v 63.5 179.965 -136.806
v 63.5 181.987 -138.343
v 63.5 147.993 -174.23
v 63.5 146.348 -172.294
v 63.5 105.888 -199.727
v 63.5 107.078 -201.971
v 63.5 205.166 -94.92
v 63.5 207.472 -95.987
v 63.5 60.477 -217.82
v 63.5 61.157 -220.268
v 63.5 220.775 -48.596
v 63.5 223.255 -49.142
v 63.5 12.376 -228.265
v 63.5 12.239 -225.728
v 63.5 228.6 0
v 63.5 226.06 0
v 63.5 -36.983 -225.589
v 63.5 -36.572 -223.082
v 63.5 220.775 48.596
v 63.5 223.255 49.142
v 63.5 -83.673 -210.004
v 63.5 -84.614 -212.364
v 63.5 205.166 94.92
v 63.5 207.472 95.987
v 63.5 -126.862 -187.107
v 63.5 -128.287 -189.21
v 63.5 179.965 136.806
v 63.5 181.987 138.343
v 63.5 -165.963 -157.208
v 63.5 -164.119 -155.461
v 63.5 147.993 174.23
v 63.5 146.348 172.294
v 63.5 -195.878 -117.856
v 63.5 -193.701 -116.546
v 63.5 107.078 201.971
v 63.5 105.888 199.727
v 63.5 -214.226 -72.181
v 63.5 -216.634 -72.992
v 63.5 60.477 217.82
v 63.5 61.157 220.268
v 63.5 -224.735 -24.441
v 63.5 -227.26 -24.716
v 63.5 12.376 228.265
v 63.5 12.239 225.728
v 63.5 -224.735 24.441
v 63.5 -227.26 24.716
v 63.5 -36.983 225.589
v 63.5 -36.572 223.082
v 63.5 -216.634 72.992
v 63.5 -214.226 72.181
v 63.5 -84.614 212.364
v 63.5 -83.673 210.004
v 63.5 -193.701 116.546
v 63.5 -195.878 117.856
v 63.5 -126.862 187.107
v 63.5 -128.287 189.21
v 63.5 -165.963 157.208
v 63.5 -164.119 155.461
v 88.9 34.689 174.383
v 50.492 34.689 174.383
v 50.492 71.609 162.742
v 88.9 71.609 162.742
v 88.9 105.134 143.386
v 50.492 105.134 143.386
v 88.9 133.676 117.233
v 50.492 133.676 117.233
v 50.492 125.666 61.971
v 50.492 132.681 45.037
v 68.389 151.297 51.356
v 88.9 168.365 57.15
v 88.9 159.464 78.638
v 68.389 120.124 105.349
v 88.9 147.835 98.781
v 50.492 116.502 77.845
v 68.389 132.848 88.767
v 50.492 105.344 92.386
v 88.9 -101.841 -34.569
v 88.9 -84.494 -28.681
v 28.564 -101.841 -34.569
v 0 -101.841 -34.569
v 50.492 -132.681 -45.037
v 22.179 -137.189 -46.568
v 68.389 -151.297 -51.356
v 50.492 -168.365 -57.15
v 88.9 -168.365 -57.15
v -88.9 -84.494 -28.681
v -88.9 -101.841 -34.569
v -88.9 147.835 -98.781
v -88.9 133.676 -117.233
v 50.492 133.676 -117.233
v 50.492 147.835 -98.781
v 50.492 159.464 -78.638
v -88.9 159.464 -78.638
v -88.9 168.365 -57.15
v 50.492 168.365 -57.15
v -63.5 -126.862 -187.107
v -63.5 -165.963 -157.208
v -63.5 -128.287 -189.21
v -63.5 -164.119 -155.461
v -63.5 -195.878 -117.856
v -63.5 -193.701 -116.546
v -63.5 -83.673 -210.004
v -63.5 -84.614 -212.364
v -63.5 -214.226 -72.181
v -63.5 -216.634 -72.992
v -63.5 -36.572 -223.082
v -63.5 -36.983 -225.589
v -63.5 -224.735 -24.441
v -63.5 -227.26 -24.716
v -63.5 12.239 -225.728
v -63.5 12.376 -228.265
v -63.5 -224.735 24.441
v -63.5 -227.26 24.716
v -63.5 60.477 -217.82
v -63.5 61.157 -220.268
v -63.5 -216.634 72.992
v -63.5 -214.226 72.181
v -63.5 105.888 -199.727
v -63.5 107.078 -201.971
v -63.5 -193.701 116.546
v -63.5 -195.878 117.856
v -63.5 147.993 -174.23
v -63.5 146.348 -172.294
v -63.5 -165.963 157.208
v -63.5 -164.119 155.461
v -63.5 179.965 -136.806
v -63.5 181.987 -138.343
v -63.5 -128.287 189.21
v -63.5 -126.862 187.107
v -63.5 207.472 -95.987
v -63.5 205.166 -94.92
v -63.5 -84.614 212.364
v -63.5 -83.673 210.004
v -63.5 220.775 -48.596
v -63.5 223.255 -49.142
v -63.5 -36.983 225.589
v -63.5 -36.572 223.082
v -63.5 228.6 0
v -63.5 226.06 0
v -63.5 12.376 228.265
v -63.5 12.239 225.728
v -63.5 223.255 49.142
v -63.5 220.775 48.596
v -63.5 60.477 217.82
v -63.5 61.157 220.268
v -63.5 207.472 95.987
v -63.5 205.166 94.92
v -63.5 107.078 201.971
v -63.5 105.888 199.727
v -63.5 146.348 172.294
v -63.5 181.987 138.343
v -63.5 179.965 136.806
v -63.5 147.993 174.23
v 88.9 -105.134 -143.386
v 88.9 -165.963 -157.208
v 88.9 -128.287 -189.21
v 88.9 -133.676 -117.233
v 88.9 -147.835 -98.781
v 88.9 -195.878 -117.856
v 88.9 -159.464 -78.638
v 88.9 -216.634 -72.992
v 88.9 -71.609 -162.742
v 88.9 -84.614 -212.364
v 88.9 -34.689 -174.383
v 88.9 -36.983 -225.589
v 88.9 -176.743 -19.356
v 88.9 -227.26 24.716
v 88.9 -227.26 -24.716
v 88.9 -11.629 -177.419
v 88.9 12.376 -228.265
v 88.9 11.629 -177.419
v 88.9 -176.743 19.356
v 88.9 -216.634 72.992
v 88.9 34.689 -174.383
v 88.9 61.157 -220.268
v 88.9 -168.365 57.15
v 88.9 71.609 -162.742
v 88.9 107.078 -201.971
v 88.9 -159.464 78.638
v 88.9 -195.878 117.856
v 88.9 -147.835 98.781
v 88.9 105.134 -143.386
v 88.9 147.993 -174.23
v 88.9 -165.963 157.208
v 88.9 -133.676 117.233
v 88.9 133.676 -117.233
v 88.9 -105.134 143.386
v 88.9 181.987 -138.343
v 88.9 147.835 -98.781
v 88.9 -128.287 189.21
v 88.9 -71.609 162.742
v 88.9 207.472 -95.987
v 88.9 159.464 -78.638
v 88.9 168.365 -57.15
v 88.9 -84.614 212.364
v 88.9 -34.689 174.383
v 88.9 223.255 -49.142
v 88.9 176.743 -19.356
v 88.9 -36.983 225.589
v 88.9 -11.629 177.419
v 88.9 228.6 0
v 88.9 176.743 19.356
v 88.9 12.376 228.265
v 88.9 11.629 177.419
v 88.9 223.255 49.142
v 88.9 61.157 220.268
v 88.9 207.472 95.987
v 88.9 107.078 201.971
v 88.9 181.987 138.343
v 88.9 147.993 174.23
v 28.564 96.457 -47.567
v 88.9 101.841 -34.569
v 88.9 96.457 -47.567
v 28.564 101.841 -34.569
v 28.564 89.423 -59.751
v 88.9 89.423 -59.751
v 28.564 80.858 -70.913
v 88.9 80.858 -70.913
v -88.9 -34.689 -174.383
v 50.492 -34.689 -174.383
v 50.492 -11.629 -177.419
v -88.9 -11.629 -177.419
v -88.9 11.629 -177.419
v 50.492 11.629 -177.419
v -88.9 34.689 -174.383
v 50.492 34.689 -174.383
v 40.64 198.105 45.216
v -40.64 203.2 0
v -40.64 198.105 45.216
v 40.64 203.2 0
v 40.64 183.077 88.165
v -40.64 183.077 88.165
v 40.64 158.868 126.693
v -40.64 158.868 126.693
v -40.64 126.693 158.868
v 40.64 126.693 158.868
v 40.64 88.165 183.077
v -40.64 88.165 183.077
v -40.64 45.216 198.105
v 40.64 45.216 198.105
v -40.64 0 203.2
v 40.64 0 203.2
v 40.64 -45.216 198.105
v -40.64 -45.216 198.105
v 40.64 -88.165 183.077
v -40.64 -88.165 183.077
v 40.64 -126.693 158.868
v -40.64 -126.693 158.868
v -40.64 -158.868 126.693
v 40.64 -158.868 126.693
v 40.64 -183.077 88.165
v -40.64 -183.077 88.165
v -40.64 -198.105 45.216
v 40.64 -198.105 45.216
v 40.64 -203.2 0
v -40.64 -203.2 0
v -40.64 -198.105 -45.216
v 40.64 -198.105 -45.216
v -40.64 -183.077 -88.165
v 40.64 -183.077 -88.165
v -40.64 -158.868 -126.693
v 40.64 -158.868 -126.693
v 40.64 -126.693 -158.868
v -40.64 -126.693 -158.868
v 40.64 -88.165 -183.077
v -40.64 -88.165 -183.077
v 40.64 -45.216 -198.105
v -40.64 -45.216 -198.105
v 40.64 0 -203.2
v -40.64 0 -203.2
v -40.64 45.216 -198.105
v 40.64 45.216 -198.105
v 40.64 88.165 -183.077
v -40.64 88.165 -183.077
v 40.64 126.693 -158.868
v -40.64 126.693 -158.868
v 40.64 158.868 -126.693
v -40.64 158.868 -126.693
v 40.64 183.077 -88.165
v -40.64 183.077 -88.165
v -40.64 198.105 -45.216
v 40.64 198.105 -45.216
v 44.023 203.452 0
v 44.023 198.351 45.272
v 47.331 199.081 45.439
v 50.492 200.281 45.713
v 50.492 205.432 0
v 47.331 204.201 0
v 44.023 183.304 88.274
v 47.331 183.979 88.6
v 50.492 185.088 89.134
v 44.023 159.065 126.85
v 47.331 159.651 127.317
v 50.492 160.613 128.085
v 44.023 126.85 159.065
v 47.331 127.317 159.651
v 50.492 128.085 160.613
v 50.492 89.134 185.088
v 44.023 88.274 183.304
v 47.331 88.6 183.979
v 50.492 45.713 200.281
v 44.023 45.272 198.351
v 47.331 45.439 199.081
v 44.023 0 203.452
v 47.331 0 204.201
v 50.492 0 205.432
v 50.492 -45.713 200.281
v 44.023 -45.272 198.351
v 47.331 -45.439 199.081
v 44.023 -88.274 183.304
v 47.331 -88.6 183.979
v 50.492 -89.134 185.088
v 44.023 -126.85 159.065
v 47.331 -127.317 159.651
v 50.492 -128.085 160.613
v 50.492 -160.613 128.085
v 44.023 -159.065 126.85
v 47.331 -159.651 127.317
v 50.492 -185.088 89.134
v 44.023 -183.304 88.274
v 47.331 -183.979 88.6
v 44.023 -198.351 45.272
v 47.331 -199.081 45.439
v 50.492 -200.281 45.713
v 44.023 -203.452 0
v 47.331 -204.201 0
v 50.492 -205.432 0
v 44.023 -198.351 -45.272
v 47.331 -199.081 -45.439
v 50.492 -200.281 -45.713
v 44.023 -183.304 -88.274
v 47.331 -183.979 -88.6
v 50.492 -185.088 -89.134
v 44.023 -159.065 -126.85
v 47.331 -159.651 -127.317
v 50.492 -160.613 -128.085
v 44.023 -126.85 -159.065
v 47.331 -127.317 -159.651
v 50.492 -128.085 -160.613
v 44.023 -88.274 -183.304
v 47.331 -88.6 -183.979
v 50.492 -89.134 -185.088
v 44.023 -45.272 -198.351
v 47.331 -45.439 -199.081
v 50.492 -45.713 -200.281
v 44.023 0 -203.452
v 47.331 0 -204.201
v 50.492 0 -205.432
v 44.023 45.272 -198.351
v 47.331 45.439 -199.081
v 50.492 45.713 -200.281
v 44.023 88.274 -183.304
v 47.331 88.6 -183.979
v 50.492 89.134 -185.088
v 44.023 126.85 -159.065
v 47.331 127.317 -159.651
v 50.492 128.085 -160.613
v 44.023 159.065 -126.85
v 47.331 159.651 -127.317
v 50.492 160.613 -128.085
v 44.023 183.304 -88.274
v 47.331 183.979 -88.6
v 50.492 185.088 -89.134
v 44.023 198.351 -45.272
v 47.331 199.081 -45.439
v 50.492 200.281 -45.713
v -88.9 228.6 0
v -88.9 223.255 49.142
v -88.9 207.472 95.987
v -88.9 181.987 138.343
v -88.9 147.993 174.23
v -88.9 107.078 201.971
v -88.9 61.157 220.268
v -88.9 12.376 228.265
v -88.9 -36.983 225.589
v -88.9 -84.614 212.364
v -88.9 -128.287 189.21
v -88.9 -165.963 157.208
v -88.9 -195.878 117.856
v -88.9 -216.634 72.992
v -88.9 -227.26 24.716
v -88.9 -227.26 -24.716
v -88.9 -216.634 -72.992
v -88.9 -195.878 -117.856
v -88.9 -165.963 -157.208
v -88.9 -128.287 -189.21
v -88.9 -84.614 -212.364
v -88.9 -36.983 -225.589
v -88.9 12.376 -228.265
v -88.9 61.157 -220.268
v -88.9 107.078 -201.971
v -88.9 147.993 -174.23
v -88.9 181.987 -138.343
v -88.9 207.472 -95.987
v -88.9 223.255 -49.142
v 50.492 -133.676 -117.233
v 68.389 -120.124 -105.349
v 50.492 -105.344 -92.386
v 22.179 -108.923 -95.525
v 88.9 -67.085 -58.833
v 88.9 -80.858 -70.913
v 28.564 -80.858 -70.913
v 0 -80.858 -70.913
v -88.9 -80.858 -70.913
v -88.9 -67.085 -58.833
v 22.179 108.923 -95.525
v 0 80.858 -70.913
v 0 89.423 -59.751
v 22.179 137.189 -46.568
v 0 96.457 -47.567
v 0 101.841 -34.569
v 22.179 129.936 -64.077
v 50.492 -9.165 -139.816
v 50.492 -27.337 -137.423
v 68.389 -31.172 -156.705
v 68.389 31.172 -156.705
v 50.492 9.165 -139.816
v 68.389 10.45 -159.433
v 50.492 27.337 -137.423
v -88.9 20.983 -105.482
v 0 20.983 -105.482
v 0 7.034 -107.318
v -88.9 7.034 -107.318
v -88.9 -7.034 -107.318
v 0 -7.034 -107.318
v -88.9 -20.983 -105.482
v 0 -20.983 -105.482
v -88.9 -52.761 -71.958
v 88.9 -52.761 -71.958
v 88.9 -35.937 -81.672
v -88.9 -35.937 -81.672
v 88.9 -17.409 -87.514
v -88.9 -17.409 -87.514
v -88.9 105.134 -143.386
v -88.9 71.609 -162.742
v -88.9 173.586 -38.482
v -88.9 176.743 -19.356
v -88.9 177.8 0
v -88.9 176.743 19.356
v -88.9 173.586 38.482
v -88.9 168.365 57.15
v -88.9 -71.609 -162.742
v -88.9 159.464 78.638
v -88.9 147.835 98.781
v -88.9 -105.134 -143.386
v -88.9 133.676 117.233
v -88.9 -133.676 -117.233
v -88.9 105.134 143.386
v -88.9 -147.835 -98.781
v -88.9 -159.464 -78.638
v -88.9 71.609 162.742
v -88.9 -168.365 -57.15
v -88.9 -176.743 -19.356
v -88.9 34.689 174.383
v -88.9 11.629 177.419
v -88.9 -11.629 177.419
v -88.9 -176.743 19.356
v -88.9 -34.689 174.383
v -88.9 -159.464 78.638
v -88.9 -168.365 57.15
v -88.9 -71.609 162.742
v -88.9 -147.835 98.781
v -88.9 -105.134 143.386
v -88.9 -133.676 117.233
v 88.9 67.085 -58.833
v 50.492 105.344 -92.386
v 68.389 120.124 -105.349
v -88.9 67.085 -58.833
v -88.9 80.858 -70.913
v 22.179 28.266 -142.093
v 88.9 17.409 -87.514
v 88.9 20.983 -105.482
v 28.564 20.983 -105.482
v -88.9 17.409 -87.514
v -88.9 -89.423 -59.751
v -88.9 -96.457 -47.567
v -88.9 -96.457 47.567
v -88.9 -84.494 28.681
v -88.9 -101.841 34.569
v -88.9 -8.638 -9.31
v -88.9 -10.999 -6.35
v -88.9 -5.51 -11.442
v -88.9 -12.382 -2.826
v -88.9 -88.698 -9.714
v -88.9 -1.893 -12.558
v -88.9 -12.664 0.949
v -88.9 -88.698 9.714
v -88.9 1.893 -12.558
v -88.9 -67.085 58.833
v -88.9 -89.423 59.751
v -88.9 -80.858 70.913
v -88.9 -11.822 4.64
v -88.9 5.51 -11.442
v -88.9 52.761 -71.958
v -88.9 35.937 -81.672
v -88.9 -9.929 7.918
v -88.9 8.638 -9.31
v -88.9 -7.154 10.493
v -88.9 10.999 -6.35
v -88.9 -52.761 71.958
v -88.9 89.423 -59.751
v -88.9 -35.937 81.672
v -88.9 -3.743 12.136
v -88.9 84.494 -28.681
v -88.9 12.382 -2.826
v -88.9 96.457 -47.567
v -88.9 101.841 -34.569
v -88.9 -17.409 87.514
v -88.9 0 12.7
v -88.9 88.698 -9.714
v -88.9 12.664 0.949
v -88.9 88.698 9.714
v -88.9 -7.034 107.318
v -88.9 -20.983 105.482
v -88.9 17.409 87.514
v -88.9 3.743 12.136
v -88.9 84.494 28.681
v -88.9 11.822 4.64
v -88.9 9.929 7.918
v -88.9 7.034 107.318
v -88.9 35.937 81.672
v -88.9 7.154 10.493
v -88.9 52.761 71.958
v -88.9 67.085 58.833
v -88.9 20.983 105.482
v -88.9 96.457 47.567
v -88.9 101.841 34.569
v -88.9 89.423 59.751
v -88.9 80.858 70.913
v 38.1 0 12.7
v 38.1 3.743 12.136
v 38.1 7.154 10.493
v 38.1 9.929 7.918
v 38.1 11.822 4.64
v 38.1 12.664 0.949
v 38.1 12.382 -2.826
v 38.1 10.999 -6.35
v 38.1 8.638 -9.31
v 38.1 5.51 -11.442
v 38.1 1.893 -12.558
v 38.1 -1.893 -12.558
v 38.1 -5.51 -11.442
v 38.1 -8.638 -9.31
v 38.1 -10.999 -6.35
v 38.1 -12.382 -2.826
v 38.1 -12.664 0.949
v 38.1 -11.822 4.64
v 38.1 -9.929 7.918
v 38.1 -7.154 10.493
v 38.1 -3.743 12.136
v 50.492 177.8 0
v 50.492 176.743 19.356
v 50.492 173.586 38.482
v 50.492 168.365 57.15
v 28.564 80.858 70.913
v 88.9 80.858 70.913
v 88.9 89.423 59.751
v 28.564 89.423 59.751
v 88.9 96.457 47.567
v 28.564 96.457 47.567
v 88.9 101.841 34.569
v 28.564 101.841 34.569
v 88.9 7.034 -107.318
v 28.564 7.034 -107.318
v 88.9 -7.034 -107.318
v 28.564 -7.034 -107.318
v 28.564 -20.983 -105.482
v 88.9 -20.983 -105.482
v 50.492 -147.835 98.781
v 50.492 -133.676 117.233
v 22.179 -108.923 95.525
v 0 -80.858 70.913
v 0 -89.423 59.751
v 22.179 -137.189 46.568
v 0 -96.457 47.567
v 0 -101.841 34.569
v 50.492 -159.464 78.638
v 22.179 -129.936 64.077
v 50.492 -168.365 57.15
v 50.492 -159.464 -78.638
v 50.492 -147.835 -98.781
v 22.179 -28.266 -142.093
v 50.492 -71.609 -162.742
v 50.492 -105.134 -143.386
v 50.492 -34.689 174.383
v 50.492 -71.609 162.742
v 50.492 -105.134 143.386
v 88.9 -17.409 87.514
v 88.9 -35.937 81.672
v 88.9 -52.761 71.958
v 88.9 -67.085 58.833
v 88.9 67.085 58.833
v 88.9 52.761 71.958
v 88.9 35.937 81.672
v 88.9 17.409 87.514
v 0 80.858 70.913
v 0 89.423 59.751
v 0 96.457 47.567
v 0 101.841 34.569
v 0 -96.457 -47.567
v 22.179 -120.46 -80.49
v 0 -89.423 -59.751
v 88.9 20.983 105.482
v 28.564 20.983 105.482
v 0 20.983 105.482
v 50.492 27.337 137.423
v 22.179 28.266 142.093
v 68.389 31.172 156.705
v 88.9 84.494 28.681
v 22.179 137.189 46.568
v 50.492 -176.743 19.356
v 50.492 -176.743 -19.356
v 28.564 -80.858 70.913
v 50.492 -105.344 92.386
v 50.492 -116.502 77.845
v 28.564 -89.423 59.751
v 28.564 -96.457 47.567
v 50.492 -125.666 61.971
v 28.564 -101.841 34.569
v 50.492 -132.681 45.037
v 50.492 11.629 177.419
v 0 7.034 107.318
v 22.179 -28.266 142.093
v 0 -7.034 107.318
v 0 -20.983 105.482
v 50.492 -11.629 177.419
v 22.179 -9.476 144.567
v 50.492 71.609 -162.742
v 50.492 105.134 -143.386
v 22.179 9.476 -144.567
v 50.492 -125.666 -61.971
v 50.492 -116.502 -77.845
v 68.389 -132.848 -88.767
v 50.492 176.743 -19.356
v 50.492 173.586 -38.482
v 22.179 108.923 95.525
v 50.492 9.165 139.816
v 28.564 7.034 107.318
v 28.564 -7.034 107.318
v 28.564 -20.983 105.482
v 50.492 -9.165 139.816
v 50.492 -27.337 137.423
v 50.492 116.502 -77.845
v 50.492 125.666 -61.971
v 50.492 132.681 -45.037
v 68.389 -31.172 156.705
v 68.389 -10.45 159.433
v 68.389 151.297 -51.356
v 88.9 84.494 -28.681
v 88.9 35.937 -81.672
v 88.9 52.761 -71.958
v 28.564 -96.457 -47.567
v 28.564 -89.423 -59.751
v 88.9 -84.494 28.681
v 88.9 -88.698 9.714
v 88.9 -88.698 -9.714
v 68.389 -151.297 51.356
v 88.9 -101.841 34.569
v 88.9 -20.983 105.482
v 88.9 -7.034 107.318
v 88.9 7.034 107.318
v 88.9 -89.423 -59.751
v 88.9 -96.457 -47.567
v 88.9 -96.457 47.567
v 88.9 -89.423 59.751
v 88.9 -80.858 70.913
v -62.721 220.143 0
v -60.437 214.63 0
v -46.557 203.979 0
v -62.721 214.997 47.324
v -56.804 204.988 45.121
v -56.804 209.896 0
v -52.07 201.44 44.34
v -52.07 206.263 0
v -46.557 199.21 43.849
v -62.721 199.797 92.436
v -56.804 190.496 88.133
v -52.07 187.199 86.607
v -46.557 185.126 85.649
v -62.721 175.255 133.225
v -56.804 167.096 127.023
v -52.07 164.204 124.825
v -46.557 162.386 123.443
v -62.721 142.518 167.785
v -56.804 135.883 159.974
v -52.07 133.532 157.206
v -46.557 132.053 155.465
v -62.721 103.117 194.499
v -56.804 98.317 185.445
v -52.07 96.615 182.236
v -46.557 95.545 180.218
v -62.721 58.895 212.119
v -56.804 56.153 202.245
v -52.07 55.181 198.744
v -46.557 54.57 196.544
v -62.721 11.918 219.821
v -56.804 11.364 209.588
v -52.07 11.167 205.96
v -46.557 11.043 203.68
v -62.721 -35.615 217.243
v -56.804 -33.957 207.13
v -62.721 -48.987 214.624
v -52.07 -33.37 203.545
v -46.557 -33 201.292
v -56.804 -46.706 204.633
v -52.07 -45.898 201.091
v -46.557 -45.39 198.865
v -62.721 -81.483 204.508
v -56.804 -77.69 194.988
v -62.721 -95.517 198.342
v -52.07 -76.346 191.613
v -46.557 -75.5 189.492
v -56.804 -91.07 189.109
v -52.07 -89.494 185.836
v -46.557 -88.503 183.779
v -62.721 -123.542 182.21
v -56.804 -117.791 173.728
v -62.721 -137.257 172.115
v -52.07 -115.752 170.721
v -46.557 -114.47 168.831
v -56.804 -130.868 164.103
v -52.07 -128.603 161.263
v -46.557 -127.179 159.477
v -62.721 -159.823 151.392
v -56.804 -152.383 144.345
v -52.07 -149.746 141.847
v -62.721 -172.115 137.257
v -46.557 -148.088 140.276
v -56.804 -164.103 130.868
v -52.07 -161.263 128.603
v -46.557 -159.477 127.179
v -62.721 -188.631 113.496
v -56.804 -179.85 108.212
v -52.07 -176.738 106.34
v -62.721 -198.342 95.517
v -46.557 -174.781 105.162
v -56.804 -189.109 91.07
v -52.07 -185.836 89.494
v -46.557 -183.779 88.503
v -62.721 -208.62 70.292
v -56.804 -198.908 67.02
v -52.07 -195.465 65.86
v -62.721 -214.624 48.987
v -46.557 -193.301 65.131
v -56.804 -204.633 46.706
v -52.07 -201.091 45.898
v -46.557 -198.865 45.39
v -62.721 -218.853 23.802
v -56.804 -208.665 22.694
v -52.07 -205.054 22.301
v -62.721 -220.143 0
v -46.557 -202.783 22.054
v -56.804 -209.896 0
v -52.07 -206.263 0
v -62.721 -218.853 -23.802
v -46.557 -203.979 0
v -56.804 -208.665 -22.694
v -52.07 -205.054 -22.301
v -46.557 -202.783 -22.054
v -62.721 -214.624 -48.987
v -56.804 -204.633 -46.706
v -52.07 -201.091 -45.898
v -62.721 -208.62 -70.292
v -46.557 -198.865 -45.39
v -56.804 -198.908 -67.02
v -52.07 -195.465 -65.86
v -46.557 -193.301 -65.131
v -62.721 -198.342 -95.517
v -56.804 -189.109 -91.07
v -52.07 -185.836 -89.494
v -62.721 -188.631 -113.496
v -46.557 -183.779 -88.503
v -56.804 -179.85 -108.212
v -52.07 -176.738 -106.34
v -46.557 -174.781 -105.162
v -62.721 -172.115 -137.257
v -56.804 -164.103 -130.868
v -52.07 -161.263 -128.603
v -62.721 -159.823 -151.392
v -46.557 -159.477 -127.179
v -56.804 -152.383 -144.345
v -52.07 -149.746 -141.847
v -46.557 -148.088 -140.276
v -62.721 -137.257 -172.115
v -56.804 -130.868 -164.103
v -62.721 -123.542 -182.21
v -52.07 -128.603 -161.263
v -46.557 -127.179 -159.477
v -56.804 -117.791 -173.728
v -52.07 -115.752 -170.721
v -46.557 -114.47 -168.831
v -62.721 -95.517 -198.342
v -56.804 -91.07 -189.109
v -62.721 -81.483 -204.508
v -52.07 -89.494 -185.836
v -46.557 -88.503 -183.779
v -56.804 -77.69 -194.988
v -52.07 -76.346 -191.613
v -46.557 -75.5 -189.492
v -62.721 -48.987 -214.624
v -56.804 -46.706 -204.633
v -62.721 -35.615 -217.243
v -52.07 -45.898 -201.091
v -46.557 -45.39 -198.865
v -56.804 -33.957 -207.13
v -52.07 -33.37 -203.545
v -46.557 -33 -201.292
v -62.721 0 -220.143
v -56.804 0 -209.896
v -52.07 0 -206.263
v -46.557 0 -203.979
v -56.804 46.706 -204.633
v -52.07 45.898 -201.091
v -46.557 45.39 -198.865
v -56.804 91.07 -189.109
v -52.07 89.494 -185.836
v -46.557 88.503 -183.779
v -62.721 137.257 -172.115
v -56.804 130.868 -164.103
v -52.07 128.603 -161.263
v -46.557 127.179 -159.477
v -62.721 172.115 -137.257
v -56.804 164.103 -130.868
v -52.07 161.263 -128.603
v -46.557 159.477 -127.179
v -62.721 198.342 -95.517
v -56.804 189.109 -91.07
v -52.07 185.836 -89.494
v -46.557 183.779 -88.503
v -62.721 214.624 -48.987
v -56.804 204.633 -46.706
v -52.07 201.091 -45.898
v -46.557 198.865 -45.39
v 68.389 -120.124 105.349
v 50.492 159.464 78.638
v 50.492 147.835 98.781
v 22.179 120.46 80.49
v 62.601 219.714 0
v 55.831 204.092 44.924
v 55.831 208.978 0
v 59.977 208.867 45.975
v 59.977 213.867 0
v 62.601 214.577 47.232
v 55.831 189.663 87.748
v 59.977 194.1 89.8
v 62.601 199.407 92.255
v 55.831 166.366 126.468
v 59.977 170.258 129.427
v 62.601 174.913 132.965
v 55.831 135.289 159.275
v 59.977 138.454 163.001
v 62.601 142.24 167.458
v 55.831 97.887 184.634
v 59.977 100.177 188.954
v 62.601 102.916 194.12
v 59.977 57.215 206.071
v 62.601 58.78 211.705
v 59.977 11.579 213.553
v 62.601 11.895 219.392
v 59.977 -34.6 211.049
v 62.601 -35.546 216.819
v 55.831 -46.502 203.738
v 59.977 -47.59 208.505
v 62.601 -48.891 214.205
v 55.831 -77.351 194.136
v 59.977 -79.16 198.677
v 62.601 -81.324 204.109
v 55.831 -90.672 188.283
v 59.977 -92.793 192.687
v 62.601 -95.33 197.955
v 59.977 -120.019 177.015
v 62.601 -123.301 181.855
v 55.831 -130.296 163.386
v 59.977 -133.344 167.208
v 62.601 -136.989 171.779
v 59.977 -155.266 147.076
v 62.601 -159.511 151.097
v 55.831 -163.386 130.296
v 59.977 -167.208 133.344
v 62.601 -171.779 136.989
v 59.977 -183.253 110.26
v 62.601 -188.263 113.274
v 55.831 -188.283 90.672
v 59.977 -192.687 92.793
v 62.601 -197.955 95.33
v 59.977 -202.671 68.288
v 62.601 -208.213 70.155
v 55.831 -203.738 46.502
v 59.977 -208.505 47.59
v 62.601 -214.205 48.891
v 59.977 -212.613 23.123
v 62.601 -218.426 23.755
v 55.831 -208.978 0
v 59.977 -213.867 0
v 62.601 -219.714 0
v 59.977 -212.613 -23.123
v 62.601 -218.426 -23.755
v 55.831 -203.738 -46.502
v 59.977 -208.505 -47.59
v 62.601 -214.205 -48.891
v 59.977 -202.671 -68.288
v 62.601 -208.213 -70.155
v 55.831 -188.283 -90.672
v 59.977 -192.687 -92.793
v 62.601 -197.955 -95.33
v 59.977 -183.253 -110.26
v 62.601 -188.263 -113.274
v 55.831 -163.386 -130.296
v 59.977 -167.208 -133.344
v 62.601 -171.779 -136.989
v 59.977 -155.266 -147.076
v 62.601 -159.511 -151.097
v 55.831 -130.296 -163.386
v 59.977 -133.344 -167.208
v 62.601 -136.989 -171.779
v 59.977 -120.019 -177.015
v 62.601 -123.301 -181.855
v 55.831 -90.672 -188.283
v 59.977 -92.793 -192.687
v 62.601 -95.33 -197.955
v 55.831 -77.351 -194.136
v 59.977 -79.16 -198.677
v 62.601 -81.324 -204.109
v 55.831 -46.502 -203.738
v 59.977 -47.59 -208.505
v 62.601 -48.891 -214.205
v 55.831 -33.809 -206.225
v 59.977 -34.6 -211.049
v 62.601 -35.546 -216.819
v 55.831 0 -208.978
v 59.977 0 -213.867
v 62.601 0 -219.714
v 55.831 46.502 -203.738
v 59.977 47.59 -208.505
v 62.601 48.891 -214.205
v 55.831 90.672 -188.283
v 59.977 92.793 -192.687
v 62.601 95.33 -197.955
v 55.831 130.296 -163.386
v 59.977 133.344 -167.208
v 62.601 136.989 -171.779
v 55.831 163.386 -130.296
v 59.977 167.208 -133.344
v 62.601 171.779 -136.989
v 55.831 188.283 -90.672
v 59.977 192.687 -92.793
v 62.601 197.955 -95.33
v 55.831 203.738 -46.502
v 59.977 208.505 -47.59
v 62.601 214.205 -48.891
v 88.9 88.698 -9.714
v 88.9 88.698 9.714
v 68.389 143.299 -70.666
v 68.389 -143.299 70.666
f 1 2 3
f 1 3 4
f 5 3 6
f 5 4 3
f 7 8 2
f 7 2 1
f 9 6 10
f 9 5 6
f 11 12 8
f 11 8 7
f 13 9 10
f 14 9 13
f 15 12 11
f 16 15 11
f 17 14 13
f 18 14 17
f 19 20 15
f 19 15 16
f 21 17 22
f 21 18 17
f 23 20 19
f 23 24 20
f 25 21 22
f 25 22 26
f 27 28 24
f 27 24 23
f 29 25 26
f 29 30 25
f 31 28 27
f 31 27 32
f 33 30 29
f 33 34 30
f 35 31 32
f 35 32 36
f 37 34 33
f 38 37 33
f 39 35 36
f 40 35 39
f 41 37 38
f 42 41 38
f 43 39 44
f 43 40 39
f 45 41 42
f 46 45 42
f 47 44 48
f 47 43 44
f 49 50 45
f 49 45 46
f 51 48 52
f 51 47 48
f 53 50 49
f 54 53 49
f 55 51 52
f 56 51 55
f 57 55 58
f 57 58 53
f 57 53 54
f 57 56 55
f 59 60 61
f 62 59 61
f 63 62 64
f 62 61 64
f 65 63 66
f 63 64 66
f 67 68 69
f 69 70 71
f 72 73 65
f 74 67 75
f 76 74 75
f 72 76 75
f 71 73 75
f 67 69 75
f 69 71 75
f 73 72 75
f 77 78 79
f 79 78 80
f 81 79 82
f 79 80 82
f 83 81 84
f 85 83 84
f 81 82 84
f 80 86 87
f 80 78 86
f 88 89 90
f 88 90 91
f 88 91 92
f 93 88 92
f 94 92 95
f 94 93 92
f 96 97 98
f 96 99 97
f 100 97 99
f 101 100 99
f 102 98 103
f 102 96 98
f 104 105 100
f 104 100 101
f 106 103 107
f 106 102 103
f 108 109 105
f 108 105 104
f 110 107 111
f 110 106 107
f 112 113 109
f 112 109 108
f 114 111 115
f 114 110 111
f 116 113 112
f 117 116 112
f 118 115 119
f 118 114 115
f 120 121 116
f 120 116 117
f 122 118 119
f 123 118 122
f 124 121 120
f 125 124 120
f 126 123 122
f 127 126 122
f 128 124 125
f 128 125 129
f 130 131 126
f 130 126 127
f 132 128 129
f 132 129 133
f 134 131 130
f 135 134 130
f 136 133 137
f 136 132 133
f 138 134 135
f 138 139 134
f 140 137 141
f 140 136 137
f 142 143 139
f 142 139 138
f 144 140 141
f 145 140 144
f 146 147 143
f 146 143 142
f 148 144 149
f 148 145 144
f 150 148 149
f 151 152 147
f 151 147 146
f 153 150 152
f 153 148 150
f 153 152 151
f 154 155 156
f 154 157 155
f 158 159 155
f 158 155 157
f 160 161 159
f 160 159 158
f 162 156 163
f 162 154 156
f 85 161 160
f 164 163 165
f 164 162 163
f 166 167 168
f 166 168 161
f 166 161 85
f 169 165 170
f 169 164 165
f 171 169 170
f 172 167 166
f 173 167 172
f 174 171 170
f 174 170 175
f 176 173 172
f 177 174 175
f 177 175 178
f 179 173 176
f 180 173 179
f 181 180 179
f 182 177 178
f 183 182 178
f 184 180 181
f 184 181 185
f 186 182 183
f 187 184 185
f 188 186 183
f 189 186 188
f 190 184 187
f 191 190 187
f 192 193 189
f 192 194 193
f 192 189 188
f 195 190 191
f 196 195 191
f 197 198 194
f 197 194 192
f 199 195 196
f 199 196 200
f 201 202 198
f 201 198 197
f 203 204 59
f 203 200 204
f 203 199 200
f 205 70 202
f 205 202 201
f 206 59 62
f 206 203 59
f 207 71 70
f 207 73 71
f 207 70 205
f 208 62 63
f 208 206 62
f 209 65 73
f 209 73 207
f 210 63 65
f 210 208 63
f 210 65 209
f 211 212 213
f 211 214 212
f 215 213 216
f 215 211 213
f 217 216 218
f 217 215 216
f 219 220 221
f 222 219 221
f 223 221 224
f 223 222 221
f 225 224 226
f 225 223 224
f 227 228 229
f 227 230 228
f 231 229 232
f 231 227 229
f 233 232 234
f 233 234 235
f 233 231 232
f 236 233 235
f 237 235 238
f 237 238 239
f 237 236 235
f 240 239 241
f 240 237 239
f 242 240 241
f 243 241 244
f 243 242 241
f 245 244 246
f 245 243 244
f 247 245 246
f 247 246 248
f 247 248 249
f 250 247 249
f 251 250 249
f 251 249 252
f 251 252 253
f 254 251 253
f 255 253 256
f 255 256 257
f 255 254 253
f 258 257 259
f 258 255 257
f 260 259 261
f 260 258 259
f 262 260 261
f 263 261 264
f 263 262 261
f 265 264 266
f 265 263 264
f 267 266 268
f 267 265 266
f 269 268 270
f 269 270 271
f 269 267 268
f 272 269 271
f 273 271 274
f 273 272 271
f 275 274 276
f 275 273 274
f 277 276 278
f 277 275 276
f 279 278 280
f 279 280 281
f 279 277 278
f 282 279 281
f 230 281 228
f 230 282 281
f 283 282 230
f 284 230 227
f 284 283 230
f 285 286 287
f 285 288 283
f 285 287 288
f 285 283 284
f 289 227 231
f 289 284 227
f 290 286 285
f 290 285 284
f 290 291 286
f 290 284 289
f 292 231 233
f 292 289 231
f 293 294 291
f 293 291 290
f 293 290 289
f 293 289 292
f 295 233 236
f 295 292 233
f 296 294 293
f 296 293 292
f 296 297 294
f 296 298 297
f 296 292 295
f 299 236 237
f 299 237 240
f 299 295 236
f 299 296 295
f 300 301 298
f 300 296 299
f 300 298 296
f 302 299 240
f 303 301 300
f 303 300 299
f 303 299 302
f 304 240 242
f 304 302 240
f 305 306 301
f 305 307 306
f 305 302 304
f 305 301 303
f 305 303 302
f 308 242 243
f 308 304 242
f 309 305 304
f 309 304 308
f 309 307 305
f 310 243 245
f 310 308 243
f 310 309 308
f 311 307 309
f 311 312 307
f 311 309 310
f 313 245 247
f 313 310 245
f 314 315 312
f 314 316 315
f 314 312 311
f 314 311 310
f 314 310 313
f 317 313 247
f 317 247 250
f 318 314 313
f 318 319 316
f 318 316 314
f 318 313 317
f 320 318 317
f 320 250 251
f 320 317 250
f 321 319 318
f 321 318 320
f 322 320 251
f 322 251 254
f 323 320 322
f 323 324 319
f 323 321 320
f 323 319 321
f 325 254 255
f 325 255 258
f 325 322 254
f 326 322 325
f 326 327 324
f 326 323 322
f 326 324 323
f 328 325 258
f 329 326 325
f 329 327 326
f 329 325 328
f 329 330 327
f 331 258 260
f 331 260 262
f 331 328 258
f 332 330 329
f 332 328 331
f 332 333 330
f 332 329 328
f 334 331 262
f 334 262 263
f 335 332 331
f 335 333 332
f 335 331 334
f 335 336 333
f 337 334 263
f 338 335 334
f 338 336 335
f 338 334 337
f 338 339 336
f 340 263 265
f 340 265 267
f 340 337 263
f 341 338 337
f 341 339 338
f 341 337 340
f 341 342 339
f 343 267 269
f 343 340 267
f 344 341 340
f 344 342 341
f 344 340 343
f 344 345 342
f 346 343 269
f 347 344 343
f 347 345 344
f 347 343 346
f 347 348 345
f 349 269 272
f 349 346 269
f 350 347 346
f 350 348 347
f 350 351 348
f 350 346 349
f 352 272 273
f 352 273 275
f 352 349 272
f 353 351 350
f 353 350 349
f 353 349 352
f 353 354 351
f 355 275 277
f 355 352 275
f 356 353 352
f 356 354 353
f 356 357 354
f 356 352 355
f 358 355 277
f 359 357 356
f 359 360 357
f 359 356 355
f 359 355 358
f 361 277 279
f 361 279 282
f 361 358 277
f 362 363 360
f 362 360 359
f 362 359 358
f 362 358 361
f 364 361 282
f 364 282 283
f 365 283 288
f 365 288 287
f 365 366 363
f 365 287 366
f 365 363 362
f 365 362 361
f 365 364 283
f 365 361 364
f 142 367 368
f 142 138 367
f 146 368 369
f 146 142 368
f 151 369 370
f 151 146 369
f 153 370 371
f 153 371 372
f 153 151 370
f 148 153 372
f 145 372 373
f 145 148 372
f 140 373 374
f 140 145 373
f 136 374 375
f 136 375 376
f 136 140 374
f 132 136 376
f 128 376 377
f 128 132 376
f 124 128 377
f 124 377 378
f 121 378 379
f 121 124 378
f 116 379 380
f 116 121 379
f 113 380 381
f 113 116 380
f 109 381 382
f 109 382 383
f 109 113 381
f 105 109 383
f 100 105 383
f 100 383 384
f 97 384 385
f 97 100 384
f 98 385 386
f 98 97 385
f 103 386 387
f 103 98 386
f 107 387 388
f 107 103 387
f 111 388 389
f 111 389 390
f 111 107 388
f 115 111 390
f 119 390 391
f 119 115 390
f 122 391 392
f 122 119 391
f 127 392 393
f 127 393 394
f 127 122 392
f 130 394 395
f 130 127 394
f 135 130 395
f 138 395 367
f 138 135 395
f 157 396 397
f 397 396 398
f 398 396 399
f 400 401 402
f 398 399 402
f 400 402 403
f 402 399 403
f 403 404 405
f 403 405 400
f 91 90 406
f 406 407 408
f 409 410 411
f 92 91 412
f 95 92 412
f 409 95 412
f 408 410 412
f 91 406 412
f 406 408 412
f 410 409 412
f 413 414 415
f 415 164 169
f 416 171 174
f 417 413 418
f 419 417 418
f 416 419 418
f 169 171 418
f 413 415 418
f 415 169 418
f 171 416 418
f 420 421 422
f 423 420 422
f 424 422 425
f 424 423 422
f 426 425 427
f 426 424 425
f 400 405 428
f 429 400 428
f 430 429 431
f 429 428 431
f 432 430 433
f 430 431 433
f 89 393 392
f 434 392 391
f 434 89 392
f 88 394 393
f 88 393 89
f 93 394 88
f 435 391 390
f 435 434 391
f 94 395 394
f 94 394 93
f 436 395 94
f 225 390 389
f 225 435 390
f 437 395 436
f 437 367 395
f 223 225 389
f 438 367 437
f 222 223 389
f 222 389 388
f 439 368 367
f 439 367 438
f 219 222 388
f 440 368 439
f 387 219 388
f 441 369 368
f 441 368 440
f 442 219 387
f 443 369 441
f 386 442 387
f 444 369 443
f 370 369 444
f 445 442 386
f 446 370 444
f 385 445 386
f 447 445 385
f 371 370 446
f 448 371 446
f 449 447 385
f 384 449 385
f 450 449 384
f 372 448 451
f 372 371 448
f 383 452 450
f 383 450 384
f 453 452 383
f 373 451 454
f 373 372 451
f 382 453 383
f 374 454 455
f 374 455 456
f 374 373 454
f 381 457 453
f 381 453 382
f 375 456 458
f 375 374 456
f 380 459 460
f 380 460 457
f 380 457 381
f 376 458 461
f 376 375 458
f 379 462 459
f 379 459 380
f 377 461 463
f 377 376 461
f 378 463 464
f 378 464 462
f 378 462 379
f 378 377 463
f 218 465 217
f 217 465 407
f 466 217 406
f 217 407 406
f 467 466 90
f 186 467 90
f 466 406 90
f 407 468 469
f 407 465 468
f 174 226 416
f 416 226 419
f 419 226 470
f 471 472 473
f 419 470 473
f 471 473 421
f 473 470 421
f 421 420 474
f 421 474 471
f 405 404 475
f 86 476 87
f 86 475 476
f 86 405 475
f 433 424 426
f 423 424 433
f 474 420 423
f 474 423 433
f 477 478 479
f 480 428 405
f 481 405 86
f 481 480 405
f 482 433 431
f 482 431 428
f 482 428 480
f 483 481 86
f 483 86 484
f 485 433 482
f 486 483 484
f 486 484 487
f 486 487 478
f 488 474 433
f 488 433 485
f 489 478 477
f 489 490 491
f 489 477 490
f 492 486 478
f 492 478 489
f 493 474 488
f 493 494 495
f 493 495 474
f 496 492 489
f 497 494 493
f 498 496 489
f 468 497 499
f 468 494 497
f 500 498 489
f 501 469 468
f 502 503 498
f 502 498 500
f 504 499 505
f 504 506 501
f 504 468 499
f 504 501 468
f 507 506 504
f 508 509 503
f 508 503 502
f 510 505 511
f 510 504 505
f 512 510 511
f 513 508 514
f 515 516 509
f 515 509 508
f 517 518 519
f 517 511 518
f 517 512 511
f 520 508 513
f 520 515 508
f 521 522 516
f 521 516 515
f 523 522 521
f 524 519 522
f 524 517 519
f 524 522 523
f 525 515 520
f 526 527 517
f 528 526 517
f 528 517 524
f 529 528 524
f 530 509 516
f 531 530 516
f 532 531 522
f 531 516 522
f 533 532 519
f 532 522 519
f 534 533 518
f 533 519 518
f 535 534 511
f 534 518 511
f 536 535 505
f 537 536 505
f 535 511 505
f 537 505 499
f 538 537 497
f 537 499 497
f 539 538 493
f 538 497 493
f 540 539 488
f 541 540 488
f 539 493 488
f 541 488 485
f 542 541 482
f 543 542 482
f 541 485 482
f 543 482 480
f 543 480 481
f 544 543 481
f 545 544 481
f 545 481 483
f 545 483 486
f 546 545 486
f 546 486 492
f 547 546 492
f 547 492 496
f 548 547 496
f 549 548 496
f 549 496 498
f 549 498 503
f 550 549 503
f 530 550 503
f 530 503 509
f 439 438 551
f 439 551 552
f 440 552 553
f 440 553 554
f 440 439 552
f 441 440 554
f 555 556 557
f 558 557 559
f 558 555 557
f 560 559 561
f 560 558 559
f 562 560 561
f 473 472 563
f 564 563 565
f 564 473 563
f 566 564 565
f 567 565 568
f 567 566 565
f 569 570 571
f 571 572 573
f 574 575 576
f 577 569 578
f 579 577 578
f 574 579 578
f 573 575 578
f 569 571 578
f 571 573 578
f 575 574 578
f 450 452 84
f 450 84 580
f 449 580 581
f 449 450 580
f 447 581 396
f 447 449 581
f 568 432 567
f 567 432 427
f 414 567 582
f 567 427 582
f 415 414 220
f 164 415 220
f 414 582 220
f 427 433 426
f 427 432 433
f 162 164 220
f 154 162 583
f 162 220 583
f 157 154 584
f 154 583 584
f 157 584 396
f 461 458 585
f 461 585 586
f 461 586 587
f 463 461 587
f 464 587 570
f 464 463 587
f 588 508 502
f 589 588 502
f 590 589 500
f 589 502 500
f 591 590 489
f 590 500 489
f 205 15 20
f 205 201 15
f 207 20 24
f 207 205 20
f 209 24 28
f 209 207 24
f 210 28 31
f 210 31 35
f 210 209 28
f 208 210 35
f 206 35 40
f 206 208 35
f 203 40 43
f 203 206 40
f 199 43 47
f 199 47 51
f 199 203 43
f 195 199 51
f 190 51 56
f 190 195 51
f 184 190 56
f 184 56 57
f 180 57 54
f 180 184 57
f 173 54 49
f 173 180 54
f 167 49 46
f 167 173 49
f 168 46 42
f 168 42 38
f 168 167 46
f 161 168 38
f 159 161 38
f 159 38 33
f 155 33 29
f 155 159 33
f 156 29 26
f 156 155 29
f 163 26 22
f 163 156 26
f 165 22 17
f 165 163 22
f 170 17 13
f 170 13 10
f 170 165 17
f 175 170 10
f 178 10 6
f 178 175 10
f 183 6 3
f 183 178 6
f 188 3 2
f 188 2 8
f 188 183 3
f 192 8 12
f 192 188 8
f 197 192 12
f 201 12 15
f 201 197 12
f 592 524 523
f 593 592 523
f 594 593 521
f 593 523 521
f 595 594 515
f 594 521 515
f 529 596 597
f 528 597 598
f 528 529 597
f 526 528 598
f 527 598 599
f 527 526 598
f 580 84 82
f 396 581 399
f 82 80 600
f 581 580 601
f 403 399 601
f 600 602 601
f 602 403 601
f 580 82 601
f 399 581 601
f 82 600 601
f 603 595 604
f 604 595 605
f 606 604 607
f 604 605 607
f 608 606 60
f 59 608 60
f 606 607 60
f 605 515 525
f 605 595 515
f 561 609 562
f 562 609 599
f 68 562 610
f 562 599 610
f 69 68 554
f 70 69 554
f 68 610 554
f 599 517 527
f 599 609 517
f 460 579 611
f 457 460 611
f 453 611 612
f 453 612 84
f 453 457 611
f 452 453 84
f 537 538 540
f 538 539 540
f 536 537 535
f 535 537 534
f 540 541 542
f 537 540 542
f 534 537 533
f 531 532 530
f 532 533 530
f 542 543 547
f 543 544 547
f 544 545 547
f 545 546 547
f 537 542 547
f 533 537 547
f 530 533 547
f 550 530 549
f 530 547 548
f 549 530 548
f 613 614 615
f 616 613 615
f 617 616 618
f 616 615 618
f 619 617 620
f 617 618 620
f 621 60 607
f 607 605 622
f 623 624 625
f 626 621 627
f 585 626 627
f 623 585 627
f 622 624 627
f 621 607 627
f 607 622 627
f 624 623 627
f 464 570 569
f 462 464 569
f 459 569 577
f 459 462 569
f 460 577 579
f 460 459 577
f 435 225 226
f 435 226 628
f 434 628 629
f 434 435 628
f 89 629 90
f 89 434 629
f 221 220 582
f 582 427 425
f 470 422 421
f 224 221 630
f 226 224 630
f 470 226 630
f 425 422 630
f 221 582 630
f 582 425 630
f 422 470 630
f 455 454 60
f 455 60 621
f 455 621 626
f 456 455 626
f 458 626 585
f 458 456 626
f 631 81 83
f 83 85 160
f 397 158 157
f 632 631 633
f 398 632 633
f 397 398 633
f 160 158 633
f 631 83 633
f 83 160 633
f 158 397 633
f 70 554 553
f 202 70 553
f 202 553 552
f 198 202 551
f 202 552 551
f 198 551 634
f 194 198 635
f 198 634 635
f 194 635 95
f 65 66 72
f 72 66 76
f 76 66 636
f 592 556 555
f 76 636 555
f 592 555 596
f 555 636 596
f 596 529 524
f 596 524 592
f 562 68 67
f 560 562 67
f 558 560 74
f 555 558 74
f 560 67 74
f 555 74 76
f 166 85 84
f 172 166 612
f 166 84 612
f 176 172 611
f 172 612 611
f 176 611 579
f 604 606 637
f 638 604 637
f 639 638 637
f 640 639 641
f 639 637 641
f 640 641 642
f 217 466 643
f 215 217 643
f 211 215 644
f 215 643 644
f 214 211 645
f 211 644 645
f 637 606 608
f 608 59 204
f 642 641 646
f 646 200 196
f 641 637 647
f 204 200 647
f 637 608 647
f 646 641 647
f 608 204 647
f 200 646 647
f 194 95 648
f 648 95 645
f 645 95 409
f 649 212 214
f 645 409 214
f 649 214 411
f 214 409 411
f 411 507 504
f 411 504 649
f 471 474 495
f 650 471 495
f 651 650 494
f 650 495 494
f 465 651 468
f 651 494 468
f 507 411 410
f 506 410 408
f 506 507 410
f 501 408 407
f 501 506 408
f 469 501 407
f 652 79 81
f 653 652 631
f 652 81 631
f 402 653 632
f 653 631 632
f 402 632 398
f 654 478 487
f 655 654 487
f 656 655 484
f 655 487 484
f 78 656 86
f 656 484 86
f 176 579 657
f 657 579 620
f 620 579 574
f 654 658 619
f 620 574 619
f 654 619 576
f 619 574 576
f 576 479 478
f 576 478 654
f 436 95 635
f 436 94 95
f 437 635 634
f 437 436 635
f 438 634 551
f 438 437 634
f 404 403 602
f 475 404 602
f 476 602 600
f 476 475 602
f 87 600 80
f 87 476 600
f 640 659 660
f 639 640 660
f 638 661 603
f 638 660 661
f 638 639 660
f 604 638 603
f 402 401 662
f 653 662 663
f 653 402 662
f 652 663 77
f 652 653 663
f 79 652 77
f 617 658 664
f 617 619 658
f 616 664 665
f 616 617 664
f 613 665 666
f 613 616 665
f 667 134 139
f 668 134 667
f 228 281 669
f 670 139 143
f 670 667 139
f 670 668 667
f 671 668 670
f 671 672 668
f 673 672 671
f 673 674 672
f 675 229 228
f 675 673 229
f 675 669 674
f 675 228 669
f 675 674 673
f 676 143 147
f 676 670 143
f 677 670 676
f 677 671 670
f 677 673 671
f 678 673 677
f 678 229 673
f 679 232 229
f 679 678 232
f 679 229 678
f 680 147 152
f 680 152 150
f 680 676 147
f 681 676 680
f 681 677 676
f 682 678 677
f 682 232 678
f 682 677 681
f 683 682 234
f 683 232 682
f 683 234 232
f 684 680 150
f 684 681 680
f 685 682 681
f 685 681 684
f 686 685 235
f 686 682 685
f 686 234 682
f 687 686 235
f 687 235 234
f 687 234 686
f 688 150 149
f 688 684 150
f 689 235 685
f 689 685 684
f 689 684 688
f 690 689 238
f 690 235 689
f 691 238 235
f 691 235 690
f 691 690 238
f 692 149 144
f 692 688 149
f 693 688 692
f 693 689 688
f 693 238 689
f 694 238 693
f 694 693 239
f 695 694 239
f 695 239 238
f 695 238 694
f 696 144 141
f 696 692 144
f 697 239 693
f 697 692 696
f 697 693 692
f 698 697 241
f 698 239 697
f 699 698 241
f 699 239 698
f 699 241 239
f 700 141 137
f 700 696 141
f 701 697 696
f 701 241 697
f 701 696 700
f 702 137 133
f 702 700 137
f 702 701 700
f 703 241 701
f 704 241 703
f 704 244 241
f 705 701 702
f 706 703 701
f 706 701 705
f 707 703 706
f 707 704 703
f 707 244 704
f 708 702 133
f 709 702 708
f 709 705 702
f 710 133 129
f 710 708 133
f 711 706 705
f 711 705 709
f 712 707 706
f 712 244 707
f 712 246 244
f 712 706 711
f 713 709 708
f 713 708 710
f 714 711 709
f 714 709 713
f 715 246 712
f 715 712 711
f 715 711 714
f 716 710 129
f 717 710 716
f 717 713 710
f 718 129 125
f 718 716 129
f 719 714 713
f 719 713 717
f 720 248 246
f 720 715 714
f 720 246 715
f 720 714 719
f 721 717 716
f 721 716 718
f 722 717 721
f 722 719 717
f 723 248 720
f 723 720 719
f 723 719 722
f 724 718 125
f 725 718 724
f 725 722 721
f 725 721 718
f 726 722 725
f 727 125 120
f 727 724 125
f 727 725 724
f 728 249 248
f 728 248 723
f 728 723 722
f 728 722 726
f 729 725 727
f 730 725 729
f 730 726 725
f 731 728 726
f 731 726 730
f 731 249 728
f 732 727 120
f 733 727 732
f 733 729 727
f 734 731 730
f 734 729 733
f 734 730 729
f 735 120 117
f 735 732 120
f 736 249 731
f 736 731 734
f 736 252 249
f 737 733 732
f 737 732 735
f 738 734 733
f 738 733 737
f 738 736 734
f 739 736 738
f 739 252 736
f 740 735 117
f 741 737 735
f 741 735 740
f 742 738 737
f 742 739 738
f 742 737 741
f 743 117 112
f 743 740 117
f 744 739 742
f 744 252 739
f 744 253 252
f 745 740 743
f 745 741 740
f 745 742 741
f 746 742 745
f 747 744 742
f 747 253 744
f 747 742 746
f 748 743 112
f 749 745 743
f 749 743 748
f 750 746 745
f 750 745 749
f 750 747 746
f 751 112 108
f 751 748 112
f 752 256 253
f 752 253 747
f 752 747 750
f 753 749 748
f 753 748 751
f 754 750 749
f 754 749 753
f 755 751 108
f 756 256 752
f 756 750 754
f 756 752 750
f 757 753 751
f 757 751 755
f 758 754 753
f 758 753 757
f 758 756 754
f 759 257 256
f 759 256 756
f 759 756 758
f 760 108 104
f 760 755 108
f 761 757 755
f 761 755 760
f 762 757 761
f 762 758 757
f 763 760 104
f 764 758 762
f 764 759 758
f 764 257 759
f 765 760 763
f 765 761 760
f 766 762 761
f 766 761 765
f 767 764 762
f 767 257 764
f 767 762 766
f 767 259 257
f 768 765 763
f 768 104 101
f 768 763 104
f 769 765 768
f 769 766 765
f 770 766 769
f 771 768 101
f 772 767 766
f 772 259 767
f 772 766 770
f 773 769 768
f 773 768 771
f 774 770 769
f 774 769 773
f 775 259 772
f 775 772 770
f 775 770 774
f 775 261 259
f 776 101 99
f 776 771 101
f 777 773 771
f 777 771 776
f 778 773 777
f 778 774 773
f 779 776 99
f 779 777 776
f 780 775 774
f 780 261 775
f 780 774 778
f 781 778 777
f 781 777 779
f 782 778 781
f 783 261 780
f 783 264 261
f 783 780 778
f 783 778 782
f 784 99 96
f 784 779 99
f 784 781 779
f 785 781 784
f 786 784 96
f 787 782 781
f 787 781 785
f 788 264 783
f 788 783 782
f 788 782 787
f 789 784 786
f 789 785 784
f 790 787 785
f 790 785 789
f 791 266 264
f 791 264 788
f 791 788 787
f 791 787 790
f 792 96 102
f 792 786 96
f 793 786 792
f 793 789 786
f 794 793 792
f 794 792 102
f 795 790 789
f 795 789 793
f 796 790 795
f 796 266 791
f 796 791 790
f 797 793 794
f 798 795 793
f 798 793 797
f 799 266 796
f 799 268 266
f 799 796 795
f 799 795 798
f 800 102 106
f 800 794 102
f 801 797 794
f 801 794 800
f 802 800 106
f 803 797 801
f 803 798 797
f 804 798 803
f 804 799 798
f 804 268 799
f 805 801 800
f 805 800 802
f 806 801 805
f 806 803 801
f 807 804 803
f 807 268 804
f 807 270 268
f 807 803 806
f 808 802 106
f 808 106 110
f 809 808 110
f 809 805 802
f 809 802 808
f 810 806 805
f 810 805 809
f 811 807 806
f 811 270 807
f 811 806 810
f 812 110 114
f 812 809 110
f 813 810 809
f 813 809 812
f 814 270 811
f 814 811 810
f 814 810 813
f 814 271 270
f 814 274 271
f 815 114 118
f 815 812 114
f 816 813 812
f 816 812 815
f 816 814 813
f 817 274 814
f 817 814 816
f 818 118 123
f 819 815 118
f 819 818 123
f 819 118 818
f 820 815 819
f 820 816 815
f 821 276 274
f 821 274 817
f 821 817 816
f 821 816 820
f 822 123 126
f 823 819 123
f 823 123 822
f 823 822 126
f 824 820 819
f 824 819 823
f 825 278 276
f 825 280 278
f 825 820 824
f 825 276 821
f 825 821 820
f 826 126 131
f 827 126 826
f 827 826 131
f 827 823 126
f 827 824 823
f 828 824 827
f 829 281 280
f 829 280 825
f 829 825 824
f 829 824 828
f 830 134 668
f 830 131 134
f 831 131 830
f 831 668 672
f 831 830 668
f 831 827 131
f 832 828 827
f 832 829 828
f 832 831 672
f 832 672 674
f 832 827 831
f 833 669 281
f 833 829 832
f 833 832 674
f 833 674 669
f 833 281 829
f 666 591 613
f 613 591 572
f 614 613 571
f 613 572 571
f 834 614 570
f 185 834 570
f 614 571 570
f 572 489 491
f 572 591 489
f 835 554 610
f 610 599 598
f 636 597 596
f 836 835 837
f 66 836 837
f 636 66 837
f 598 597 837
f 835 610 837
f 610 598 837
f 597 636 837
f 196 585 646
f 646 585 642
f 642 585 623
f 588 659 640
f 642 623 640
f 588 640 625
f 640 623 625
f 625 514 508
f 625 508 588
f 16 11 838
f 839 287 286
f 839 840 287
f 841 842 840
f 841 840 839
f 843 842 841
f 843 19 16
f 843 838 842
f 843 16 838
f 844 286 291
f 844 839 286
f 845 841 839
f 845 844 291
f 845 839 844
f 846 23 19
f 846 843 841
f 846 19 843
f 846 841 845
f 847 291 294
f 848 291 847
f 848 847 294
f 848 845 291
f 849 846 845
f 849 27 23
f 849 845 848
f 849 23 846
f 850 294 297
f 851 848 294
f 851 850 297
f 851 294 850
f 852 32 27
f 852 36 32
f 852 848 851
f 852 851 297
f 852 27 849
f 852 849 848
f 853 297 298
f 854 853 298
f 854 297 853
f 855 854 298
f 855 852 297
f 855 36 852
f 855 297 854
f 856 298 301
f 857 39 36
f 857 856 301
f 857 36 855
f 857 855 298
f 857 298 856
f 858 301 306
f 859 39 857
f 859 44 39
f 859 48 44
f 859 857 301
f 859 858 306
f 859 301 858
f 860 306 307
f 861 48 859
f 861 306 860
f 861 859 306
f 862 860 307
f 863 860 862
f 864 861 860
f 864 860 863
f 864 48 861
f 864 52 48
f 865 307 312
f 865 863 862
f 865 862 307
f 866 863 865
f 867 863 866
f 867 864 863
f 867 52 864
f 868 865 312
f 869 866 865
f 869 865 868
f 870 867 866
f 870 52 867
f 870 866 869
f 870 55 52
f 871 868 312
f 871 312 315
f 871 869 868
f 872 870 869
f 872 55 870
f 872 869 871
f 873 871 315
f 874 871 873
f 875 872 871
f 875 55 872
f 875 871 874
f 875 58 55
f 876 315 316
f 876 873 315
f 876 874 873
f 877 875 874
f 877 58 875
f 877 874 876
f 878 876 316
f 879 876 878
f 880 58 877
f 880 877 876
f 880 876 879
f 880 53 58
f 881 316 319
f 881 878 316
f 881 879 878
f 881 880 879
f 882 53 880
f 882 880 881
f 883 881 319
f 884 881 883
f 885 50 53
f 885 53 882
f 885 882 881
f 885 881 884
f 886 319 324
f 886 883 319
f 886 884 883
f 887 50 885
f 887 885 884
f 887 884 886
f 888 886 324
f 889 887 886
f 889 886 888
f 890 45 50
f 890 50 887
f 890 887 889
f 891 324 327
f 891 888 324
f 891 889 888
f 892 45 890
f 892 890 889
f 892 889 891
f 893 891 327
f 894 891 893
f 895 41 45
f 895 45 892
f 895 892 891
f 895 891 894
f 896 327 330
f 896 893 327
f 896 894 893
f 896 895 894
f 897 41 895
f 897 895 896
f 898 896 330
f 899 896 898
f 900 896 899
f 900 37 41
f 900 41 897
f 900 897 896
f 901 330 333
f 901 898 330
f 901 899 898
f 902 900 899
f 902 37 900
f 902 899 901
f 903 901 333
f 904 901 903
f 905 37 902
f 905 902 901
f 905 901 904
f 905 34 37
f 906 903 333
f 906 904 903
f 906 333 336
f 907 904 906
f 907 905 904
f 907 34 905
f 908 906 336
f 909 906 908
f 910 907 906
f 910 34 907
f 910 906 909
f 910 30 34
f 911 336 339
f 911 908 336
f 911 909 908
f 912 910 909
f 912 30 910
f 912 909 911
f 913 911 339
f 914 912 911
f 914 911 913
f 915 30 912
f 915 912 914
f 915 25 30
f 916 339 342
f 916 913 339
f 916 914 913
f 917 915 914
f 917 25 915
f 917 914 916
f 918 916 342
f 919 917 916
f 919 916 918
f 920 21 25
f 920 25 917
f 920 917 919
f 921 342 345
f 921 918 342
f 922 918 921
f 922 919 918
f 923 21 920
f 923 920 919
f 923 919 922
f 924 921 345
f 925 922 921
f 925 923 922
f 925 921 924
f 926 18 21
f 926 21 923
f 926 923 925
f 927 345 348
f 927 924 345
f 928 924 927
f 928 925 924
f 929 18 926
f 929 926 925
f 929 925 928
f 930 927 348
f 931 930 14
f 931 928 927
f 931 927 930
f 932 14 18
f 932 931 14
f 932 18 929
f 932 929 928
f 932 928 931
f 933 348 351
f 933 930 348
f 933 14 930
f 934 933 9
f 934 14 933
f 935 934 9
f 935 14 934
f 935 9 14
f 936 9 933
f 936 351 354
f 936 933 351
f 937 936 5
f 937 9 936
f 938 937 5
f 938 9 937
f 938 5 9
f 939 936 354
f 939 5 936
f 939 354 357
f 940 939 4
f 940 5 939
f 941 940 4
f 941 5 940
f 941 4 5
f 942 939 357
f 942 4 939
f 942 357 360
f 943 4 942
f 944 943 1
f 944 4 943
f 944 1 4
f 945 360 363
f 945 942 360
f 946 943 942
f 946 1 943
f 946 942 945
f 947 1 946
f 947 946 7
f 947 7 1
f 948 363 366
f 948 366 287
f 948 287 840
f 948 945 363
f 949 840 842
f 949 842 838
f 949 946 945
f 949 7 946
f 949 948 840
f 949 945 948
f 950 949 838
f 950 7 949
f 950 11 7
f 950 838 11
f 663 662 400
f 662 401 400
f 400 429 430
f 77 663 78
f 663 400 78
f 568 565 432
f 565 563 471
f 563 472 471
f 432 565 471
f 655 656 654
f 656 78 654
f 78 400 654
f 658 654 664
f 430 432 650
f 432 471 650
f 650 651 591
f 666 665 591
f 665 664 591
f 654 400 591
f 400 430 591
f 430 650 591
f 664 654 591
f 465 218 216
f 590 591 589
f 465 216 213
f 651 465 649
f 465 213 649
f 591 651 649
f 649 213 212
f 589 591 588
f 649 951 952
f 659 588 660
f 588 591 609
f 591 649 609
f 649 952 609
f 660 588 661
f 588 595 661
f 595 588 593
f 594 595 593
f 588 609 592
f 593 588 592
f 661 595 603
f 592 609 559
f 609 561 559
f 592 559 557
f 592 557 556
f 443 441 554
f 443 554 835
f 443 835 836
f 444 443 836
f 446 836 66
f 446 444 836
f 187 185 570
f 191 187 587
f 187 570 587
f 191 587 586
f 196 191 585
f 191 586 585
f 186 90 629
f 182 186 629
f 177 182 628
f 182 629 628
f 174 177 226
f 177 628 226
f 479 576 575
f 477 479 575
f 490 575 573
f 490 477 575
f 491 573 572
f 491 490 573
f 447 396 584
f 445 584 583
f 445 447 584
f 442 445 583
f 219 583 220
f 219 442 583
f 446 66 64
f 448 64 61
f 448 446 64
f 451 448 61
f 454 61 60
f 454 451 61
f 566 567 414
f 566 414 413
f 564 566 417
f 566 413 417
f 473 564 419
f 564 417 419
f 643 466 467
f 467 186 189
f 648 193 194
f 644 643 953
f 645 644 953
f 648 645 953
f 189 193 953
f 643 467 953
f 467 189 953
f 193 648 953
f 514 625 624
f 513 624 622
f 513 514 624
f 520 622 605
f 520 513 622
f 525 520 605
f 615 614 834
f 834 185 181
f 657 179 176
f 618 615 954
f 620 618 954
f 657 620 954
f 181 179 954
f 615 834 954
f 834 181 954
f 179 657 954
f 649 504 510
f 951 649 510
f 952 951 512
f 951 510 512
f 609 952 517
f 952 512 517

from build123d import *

# Parameters (mm, degrees)
REVOLVE2_OUTLINE_W  = 25.39999999999995
REVOLVE2_OUTLINE_H  = 38.407758663
SKETCH3_R           = 107.54843304644665
SKETCH3_R_2         = 12.700000000000003
BOSS_EXTRUDE1_DEPTH = 177.79999999999998
BOSS_EXTRUDE2_START = -50.8
SKETCH4_R           = 107.54843304644665
BOSS_EXTRUDE2_DEPTH = 50.8
CUT_EXTRUDE1_START  = -508
CUT_EXTRUDE1_DEPTH  = 508
CIRPATTERN1_COUNT   = 6


# Read off the part's stored shape, not the designer's step: Revolve2
with BuildPart() as part:
    # Revolve2 outline → Revolve2 (revolve)
    with BuildSketch(Plane.YX):
        with BuildLine():
            add(Edge.make_bspline(
                [(12.7, 0), (65.56394076942757, 5.423140195743021), (107.548433046, 28.563700108)],
                knots=[0, 0, 0, 0.5115772122825497, 0.5115772122825497, 0.5115772122825497], degree=2))
            Line((12.7, 0), (107.548433046, 0))
            Line((107.548433046, 0), (107.548433046, 28.563700108))
        make_face()
        with BuildLine():
            add(Edge.make_bspline(
                [(107.548433046, 28.563700108), (124.74480096527253, 38.04180882229545), (140.116002229, 50.492241337)],
                knots=[0.5115772122825497, 0.5115772122825497, 0.5115772122825497, 0.7211133882490103, 0.7211133882490103, 0.7211133882490103], degree=2))
            Line((107.548433046, 28.563700108), (107.548433046, 0))
            add(Edge.make_bspline(
                [(177.8, 50.492241337), (174.25870908441857, 46.88747078495737), (156.1505738072, 29.8029081407884), (124.48137705008449, 8.138883125204057), (107.548433046, 0)],
                knots=[0.1400938920026617, 0.1400938920026617, 0.1400938920026617, 0.1875, 0.375, 0.5544007278163002, 0.5544007278163002, 0.5544007278163002], degree=2))
            Line((177.8, 50.492241337), (140.116002229, 50.492241337))
        make_face()
        with BuildLine():
            add(Edge.make_bspline(
                [(140.116002229, 50.492241337), (160.57462814001852, 67.06340821472577), (177.8, 88.9)],
                knots=[0.7211133882490103, 0.7211133882490103, 0.7211133882490103, 1, 1, 1], degree=2))
            Line((140.116002229, 50.492241337), (177.8, 50.492241337))
            Line((177.8, 50.492241337), (177.8, 88.9))
        make_face()
        Polygon((203.2, 50.492241337), (177.8, 50.492241337), (177.8, 0), (203.2, 0), (203.2, 40.64), align=None)
        with Locations((190.5, 69.6961206685)):
            Rectangle(REVOLVE2_OUTLINE_W, REVOLVE2_OUTLINE_H)
        Polygon((203.2, 0), (177.8, 0), (177.8, -88.9), (203.2, -88.9), (203.2, -40.64), align=None)
        with BuildLine():
            Line((205.432034985, 50.492241337), (203.2, 50.492241337))
            Line((203.2, 50.492241337), (203.2, 40.64))
            ThreePointArc((203.2, 40.64), (203.76499069, 45.690956334), (205.432034985, 50.492241337))
        make_face()
        with BuildLine():
            Line((203.2, 88.9), (203.2, 50.492241337))
            Line((203.2, 50.492241337), (205.432034985, 50.492241337))
            ThreePointArc((205.432034985, 50.492241337), (213.866613206, 59.976517745), (226.06, 63.5))
            Line((226.06, 63.5), (228.6, 63.5))
            Line((228.6, 63.5), (228.6, 88.9))
            Line((228.6, 88.9), (203.2, 88.9))
        make_face()
        with BuildLine():
            Line((203.2, -40.64), (203.2, -88.9))
            Line((203.2, -88.9), (228.6, -88.9))
            Line((228.6, -88.9), (228.6, -63.5))
            Line((228.6, -63.5), (226.06, -63.5))
            ThreePointArc((226.06, -63.5), (209.895538982, -56.804461018), (203.2, -40.64))
        make_face()
    revolve(axis=Axis((0, 0, 0), (1, 0, 0)))

    # Sketch3 → Boss-Extrude1 (add)
    with BuildSketch(Plane.ZY.offset(88.89999999999999)):
        Circle(SKETCH3_R)
        Circle(SKETCH3_R_2, mode=Mode.SUBTRACT)
    extrude(amount=-BOSS_EXTRUDE1_DEPTH)

    # Sketch4 → Boss-Extrude2 (add)
    with BuildSketch(Plane(origin=(88.89999999999999, 0, 0), x_dir=(0, 0, -1), z_dir=(1, 0, 0)).offset(BOSS_EXTRUDE2_START)):
        with Locations(Location((0, 0, 0), (0, 0, 180))):
            Circle(SKETCH4_R)
    extrude(amount=BOSS_EXTRUDE2_DEPTH)

    # Sketch5 → Cut-Extrude1 (cut)
    with BuildSketch(Plane(origin=(88.89999999999999, 0, 0), x_dir=(0, 0, -1), z_dir=(1, 0, 0)).offset(CUT_EXTRUDE1_START)):
        with BuildLine():
            Line((-28.680637108892512, 84.49362590578919), (-57.15, 168.36483451124818))
            ThreePointArc((-57.15, 168.36483451124818), (1.089e-14, 177.79999999999995), (57.15, 168.36483451124818))
            Line((57.15, 168.36483451124818), (28.680637108892512, 84.49362590578919))
            ThreePointArc((28.680637108892512, 84.49362590578919), (5.46e-15, 89.22864878322115), (-28.680637108892512, 84.49362590578919))
        make_face()
    cut_extrude1 = extrude(amount=CUT_EXTRUDE1_DEPTH, mode=Mode.SUBTRACT)

    # CirPattern1: Cut-Extrude1 ×6 about axis
    cirpattern1_axis = Axis((0, 2.4e-16, 1.8e-16), (1, 0, 0))
    for i in range(1, CIRPATTERN1_COUNT):
        add(cut_extrude1.rotate(cirpattern1_axis, i * 360 / CIRPATTERN1_COUNT), mode=Mode.SUBTRACT)


solid = part.part
